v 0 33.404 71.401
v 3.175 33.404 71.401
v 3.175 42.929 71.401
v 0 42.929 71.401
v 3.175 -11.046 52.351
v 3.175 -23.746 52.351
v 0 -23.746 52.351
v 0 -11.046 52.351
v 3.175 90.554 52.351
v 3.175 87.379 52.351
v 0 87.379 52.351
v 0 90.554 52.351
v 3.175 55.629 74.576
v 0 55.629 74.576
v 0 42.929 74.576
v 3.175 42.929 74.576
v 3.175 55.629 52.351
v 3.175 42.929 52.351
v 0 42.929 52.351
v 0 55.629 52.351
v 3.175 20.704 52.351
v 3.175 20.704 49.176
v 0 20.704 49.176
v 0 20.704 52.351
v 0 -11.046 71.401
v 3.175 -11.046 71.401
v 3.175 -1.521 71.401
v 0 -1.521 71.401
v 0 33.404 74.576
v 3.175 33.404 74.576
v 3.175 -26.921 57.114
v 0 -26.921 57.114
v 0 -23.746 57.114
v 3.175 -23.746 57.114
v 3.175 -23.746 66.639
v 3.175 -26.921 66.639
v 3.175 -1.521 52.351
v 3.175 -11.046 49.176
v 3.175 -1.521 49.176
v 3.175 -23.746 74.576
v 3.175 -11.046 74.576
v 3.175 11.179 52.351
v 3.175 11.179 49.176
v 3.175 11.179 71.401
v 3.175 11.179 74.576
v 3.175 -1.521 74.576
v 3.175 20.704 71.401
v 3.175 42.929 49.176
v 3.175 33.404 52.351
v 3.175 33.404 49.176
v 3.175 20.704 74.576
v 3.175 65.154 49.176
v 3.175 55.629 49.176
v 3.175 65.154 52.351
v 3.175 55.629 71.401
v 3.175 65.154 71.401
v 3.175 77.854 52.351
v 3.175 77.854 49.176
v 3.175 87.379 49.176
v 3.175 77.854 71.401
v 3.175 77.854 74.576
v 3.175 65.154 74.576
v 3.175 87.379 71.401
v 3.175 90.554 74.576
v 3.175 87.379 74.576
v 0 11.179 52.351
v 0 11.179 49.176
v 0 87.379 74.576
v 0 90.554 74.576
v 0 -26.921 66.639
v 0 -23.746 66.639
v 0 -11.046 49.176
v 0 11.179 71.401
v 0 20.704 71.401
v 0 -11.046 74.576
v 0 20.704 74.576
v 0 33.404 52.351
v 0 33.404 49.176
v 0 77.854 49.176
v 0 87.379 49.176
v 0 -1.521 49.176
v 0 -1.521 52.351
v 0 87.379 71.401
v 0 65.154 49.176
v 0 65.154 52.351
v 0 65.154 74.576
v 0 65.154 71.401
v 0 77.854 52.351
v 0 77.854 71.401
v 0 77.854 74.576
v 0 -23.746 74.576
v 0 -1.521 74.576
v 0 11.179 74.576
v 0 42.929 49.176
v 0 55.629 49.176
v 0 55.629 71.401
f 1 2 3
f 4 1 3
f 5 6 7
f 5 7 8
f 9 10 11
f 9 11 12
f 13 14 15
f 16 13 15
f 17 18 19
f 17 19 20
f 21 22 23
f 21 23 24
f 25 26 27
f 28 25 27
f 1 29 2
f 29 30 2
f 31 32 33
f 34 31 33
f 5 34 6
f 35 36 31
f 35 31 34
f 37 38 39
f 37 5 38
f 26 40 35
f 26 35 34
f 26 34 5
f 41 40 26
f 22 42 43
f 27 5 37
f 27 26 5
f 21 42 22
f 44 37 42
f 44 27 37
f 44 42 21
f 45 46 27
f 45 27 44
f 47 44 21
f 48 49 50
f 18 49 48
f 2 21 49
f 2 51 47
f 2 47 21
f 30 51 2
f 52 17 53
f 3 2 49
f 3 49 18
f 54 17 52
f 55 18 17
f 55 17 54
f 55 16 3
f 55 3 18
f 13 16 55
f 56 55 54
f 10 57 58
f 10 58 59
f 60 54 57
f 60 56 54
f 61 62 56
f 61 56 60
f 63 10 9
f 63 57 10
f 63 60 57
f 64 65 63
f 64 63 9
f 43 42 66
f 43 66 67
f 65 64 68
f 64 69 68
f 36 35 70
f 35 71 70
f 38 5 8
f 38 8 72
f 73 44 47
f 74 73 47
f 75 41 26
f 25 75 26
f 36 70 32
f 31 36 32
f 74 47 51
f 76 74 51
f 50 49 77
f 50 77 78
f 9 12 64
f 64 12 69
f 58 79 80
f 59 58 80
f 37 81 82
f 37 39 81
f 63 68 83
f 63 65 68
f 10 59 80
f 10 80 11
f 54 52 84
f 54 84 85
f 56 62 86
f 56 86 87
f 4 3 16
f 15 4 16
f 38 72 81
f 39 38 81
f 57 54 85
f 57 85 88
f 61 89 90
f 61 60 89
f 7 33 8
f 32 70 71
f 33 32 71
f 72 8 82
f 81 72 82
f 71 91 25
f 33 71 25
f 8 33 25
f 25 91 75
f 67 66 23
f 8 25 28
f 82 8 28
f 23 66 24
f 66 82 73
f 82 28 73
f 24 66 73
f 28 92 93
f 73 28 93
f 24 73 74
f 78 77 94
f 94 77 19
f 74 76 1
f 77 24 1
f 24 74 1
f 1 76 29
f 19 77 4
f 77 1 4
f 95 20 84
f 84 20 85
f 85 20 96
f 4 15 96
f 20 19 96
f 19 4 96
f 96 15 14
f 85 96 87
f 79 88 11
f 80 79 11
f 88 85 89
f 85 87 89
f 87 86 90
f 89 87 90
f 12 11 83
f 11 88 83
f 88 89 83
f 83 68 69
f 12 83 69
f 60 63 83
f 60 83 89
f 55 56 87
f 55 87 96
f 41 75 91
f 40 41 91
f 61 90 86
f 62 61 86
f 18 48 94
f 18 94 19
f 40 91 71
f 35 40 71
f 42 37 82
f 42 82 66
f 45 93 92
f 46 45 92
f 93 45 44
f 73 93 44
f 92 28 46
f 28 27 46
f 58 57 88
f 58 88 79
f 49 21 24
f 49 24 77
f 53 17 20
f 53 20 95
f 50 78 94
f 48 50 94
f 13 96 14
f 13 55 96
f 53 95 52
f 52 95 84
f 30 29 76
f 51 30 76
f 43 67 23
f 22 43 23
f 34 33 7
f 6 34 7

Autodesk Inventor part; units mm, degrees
ref_plane "YZ Plane" through (0, 0, 0) normal (1, 0, 0) x (0, 1, 0)
ref_plane "XZ Plane" through (0, 0, 0) normal (0, 1, 0) x (-1, 0, 0)
ref_plane "XY Plane" through (0, 0, 0) normal (0, 0, 1) x (1, 0, 0)
sketch "Sketch1" plane through (0, 0, 0) normal (1, 0, 0) x (0, 1, 0)
  line L0 (90.5542, 74.5762) -> (-23.7458, 74.5762)
  line L1 (-23.7458, 74.5762) -> (-23.7458, 49.1762)
  line L2 (-23.7458, 49.1762) -> (90.5542, 49.1762)
  line L3 (90.5542, 49.1762) -> (90.5542, 74.5762)
  line L4 (-23.7458, 66.6387) -> (-26.9208, 66.6387)
  line L5 (-26.9208, 66.6387) -> (-26.9208, 57.1137)
  line L6 (-26.9208, 57.1137) -> (-23.7458, 57.1137)
  line L7 (-23.7458, 57.1137) -> (-23.7458, 66.6387)
  point P0 (0, 0)
  dimension "d0" = 25.4
  dimension "d1" = 114.3
  dimension "d4" = 3.175
  dimension "d5" = 7.9375
  dimension "d6" = 7.9375
extrude "Extrusion2" add sketch "Sketch1" along normal blind 3.175
sketch "Sketch4" plane through (3.175, 0, 0) normal (1, 0, 0) x (0, 0, -1)
  line L0 (-49.1762, 90.5542) -> (-74.5762, 90.5542) projected
  line L1 (-66.6387, 90.5542) -> (-57.1137, 90.5542)
  line L2 (-57.1137, 90.5542) -> (-57.1137, 87.3792)
  line L3 (-57.1137, 87.3792) -> (-66.6387, 87.3792)
  line L4 (-66.6387, 87.3792) -> (-66.6387, 90.5542)
  line L5 (-49.1762, -23.7458) -> (-49.1762, 90.5542) projected
  line L6 (-74.5762, 90.5542) -> (-74.5762, -23.7458) projected
  line L7 (-74.5762, -11.0458) -> (-71.4012, -11.0458)
  line L8 (-71.4012, -11.0458) -> (-71.4012, -1.5208)
  line L9 (-71.4012, -1.5208) -> (-74.5762, -1.5208)
  line L10 (-74.5762, -1.5208) -> (-74.5762, -11.0458)
  line L11 (-74.5762, -23.7458) -> (-66.6387, -23.7458) projected
  line L12 (-74.5762, 11.1792) -> (-71.4012, 11.1792)
  line L13 (-71.4012, 11.1792) -> (-71.4012, 20.7042)
  line L14 (-71.4012, 20.7042) -> (-74.5762, 20.7042)
  line L15 (-74.5762, 20.7042) -> (-74.5762, 11.1792)
  line L16 (-74.5762, 33.4042) -> (-71.4012, 33.4042)
  line L17 (-71.4012, 33.4042) -> (-71.4012, 42.9292)
  line L18 (-71.4012, 42.9292) -> (-74.5762, 42.9292)
  line L19 (-74.5762, 42.9292) -> (-74.5762, 33.4042)
  line L20 (-71.4012, 55.6292) -> (-74.5762, 55.6292)
  line L21 (-74.5762, 55.6292) -> (-74.5762, 65.1542)
  line L22 (-74.5762, 65.1542) -> (-71.4012, 65.1542)
  line L23 (-71.4012, 65.1542) -> (-71.4012, 55.6292)
  line L24 (-71.4012, 77.8542) -> (-74.5762, 77.8542)
  line L25 (-74.5762, 77.8542) -> (-74.5762, 87.3792)
  line L26 (-74.5762, 87.3792) -> (-71.4012, 87.3792)
  line L27 (-71.4012, 87.3792) -> (-71.4012, 77.8542)
  line L28 (-49.1762, -23.7458) -> (-52.3512, -23.7458)
  line L29 (-52.3512, -23.7458) -> (-52.3512, -11.0458)
  line L30 (-52.3512, -11.0458) -> (-49.1762, -11.0458)
  line L31 (-49.1762, -11.0458) -> (-49.1762, -23.7458)
  line L32 (-49.1762, -1.5208) -> (-52.3512, -1.5208)
  line L33 (-52.3512, -1.5208) -> (-52.3512, 11.1792)
  line L34 (-52.3512, 11.1792) -> (-49.1762, 11.1792)
  line L35 (-49.1762, 11.1792) -> (-49.1762, -1.5208)
  line L36 (-49.1762, 20.7042) -> (-52.3512, 20.7042)
  line L37 (-52.3512, 20.7042) -> (-52.3512, 33.4042)
  line L38 (-52.3512, 33.4042) -> (-49.1762, 33.4042)
  line L39 (-49.1762, 33.4042) -> (-49.1762, 20.7042)
  line L40 (-49.1762, 42.9292) -> (-52.3512, 42.9292)
  line L41 (-52.3512, 42.9292) -> (-52.3512, 55.6292)
  line L42 (-52.3512, 55.6292) -> (-49.1762, 55.6292)
  line L43 (-49.1762, 55.6292) -> (-49.1762, 42.9292)
  line L44 (-49.1762, 65.1542) -> (-52.3512, 65.1542)
  line L45 (-52.3512, 65.1542) -> (-52.3512, 77.8542)
  line L46 (-52.3512, 77.8542) -> (-49.1762, 77.8542)
  line L47 (-49.1762, 77.8542) -> (-49.1762, 65.1542)
  line L48 (-49.1762, 87.3792) -> (-52.3512, 87.3792)
  line L49 (-52.3512, 87.3792) -> (-52.3512, 90.5542)
  line L50 (-52.3512, 90.5542) -> (-49.1762, 90.5542)
  line L51 (-49.1762, 90.5542) -> (-49.1762, 87.3792)
  point P0 (0, 0)
  dimension "d30" = 3.175
  dimension "d31" = 7.9375
  dimension "d32" = 7.9375
  dimension "d33" = 3.175
  dimension "d34" = 9.525
  dimension "d35" = 12.7
  dimension "d36" = 9.525
  dimension "d37" = 12.7
  dimension "d38" = 9.525
  dimension "d39" = 12.7
  dimension "d40" = 9.525
  dimension "d41" = 12.7
  dimension "d42" = 12.7
  dimension "d43" = 9.525
  dimension "d44" = 3.175
extrude "Extrusion5" cut sketch "Sketch4" against normal blind 3.175 contours L5 L48 L49 L0 | L5 L28 L29 L30 | L5 L32 L33 L34 | L5 L36 L37 L38 | L5 L40 L41 L42 | L5 L44 L45 L46 | L9 L8 L7 L6 | L14 L13 L12 L6 | L18 L17 L16 L6 | L22 L23 L20 L6 | L26 L27 L24 L6
